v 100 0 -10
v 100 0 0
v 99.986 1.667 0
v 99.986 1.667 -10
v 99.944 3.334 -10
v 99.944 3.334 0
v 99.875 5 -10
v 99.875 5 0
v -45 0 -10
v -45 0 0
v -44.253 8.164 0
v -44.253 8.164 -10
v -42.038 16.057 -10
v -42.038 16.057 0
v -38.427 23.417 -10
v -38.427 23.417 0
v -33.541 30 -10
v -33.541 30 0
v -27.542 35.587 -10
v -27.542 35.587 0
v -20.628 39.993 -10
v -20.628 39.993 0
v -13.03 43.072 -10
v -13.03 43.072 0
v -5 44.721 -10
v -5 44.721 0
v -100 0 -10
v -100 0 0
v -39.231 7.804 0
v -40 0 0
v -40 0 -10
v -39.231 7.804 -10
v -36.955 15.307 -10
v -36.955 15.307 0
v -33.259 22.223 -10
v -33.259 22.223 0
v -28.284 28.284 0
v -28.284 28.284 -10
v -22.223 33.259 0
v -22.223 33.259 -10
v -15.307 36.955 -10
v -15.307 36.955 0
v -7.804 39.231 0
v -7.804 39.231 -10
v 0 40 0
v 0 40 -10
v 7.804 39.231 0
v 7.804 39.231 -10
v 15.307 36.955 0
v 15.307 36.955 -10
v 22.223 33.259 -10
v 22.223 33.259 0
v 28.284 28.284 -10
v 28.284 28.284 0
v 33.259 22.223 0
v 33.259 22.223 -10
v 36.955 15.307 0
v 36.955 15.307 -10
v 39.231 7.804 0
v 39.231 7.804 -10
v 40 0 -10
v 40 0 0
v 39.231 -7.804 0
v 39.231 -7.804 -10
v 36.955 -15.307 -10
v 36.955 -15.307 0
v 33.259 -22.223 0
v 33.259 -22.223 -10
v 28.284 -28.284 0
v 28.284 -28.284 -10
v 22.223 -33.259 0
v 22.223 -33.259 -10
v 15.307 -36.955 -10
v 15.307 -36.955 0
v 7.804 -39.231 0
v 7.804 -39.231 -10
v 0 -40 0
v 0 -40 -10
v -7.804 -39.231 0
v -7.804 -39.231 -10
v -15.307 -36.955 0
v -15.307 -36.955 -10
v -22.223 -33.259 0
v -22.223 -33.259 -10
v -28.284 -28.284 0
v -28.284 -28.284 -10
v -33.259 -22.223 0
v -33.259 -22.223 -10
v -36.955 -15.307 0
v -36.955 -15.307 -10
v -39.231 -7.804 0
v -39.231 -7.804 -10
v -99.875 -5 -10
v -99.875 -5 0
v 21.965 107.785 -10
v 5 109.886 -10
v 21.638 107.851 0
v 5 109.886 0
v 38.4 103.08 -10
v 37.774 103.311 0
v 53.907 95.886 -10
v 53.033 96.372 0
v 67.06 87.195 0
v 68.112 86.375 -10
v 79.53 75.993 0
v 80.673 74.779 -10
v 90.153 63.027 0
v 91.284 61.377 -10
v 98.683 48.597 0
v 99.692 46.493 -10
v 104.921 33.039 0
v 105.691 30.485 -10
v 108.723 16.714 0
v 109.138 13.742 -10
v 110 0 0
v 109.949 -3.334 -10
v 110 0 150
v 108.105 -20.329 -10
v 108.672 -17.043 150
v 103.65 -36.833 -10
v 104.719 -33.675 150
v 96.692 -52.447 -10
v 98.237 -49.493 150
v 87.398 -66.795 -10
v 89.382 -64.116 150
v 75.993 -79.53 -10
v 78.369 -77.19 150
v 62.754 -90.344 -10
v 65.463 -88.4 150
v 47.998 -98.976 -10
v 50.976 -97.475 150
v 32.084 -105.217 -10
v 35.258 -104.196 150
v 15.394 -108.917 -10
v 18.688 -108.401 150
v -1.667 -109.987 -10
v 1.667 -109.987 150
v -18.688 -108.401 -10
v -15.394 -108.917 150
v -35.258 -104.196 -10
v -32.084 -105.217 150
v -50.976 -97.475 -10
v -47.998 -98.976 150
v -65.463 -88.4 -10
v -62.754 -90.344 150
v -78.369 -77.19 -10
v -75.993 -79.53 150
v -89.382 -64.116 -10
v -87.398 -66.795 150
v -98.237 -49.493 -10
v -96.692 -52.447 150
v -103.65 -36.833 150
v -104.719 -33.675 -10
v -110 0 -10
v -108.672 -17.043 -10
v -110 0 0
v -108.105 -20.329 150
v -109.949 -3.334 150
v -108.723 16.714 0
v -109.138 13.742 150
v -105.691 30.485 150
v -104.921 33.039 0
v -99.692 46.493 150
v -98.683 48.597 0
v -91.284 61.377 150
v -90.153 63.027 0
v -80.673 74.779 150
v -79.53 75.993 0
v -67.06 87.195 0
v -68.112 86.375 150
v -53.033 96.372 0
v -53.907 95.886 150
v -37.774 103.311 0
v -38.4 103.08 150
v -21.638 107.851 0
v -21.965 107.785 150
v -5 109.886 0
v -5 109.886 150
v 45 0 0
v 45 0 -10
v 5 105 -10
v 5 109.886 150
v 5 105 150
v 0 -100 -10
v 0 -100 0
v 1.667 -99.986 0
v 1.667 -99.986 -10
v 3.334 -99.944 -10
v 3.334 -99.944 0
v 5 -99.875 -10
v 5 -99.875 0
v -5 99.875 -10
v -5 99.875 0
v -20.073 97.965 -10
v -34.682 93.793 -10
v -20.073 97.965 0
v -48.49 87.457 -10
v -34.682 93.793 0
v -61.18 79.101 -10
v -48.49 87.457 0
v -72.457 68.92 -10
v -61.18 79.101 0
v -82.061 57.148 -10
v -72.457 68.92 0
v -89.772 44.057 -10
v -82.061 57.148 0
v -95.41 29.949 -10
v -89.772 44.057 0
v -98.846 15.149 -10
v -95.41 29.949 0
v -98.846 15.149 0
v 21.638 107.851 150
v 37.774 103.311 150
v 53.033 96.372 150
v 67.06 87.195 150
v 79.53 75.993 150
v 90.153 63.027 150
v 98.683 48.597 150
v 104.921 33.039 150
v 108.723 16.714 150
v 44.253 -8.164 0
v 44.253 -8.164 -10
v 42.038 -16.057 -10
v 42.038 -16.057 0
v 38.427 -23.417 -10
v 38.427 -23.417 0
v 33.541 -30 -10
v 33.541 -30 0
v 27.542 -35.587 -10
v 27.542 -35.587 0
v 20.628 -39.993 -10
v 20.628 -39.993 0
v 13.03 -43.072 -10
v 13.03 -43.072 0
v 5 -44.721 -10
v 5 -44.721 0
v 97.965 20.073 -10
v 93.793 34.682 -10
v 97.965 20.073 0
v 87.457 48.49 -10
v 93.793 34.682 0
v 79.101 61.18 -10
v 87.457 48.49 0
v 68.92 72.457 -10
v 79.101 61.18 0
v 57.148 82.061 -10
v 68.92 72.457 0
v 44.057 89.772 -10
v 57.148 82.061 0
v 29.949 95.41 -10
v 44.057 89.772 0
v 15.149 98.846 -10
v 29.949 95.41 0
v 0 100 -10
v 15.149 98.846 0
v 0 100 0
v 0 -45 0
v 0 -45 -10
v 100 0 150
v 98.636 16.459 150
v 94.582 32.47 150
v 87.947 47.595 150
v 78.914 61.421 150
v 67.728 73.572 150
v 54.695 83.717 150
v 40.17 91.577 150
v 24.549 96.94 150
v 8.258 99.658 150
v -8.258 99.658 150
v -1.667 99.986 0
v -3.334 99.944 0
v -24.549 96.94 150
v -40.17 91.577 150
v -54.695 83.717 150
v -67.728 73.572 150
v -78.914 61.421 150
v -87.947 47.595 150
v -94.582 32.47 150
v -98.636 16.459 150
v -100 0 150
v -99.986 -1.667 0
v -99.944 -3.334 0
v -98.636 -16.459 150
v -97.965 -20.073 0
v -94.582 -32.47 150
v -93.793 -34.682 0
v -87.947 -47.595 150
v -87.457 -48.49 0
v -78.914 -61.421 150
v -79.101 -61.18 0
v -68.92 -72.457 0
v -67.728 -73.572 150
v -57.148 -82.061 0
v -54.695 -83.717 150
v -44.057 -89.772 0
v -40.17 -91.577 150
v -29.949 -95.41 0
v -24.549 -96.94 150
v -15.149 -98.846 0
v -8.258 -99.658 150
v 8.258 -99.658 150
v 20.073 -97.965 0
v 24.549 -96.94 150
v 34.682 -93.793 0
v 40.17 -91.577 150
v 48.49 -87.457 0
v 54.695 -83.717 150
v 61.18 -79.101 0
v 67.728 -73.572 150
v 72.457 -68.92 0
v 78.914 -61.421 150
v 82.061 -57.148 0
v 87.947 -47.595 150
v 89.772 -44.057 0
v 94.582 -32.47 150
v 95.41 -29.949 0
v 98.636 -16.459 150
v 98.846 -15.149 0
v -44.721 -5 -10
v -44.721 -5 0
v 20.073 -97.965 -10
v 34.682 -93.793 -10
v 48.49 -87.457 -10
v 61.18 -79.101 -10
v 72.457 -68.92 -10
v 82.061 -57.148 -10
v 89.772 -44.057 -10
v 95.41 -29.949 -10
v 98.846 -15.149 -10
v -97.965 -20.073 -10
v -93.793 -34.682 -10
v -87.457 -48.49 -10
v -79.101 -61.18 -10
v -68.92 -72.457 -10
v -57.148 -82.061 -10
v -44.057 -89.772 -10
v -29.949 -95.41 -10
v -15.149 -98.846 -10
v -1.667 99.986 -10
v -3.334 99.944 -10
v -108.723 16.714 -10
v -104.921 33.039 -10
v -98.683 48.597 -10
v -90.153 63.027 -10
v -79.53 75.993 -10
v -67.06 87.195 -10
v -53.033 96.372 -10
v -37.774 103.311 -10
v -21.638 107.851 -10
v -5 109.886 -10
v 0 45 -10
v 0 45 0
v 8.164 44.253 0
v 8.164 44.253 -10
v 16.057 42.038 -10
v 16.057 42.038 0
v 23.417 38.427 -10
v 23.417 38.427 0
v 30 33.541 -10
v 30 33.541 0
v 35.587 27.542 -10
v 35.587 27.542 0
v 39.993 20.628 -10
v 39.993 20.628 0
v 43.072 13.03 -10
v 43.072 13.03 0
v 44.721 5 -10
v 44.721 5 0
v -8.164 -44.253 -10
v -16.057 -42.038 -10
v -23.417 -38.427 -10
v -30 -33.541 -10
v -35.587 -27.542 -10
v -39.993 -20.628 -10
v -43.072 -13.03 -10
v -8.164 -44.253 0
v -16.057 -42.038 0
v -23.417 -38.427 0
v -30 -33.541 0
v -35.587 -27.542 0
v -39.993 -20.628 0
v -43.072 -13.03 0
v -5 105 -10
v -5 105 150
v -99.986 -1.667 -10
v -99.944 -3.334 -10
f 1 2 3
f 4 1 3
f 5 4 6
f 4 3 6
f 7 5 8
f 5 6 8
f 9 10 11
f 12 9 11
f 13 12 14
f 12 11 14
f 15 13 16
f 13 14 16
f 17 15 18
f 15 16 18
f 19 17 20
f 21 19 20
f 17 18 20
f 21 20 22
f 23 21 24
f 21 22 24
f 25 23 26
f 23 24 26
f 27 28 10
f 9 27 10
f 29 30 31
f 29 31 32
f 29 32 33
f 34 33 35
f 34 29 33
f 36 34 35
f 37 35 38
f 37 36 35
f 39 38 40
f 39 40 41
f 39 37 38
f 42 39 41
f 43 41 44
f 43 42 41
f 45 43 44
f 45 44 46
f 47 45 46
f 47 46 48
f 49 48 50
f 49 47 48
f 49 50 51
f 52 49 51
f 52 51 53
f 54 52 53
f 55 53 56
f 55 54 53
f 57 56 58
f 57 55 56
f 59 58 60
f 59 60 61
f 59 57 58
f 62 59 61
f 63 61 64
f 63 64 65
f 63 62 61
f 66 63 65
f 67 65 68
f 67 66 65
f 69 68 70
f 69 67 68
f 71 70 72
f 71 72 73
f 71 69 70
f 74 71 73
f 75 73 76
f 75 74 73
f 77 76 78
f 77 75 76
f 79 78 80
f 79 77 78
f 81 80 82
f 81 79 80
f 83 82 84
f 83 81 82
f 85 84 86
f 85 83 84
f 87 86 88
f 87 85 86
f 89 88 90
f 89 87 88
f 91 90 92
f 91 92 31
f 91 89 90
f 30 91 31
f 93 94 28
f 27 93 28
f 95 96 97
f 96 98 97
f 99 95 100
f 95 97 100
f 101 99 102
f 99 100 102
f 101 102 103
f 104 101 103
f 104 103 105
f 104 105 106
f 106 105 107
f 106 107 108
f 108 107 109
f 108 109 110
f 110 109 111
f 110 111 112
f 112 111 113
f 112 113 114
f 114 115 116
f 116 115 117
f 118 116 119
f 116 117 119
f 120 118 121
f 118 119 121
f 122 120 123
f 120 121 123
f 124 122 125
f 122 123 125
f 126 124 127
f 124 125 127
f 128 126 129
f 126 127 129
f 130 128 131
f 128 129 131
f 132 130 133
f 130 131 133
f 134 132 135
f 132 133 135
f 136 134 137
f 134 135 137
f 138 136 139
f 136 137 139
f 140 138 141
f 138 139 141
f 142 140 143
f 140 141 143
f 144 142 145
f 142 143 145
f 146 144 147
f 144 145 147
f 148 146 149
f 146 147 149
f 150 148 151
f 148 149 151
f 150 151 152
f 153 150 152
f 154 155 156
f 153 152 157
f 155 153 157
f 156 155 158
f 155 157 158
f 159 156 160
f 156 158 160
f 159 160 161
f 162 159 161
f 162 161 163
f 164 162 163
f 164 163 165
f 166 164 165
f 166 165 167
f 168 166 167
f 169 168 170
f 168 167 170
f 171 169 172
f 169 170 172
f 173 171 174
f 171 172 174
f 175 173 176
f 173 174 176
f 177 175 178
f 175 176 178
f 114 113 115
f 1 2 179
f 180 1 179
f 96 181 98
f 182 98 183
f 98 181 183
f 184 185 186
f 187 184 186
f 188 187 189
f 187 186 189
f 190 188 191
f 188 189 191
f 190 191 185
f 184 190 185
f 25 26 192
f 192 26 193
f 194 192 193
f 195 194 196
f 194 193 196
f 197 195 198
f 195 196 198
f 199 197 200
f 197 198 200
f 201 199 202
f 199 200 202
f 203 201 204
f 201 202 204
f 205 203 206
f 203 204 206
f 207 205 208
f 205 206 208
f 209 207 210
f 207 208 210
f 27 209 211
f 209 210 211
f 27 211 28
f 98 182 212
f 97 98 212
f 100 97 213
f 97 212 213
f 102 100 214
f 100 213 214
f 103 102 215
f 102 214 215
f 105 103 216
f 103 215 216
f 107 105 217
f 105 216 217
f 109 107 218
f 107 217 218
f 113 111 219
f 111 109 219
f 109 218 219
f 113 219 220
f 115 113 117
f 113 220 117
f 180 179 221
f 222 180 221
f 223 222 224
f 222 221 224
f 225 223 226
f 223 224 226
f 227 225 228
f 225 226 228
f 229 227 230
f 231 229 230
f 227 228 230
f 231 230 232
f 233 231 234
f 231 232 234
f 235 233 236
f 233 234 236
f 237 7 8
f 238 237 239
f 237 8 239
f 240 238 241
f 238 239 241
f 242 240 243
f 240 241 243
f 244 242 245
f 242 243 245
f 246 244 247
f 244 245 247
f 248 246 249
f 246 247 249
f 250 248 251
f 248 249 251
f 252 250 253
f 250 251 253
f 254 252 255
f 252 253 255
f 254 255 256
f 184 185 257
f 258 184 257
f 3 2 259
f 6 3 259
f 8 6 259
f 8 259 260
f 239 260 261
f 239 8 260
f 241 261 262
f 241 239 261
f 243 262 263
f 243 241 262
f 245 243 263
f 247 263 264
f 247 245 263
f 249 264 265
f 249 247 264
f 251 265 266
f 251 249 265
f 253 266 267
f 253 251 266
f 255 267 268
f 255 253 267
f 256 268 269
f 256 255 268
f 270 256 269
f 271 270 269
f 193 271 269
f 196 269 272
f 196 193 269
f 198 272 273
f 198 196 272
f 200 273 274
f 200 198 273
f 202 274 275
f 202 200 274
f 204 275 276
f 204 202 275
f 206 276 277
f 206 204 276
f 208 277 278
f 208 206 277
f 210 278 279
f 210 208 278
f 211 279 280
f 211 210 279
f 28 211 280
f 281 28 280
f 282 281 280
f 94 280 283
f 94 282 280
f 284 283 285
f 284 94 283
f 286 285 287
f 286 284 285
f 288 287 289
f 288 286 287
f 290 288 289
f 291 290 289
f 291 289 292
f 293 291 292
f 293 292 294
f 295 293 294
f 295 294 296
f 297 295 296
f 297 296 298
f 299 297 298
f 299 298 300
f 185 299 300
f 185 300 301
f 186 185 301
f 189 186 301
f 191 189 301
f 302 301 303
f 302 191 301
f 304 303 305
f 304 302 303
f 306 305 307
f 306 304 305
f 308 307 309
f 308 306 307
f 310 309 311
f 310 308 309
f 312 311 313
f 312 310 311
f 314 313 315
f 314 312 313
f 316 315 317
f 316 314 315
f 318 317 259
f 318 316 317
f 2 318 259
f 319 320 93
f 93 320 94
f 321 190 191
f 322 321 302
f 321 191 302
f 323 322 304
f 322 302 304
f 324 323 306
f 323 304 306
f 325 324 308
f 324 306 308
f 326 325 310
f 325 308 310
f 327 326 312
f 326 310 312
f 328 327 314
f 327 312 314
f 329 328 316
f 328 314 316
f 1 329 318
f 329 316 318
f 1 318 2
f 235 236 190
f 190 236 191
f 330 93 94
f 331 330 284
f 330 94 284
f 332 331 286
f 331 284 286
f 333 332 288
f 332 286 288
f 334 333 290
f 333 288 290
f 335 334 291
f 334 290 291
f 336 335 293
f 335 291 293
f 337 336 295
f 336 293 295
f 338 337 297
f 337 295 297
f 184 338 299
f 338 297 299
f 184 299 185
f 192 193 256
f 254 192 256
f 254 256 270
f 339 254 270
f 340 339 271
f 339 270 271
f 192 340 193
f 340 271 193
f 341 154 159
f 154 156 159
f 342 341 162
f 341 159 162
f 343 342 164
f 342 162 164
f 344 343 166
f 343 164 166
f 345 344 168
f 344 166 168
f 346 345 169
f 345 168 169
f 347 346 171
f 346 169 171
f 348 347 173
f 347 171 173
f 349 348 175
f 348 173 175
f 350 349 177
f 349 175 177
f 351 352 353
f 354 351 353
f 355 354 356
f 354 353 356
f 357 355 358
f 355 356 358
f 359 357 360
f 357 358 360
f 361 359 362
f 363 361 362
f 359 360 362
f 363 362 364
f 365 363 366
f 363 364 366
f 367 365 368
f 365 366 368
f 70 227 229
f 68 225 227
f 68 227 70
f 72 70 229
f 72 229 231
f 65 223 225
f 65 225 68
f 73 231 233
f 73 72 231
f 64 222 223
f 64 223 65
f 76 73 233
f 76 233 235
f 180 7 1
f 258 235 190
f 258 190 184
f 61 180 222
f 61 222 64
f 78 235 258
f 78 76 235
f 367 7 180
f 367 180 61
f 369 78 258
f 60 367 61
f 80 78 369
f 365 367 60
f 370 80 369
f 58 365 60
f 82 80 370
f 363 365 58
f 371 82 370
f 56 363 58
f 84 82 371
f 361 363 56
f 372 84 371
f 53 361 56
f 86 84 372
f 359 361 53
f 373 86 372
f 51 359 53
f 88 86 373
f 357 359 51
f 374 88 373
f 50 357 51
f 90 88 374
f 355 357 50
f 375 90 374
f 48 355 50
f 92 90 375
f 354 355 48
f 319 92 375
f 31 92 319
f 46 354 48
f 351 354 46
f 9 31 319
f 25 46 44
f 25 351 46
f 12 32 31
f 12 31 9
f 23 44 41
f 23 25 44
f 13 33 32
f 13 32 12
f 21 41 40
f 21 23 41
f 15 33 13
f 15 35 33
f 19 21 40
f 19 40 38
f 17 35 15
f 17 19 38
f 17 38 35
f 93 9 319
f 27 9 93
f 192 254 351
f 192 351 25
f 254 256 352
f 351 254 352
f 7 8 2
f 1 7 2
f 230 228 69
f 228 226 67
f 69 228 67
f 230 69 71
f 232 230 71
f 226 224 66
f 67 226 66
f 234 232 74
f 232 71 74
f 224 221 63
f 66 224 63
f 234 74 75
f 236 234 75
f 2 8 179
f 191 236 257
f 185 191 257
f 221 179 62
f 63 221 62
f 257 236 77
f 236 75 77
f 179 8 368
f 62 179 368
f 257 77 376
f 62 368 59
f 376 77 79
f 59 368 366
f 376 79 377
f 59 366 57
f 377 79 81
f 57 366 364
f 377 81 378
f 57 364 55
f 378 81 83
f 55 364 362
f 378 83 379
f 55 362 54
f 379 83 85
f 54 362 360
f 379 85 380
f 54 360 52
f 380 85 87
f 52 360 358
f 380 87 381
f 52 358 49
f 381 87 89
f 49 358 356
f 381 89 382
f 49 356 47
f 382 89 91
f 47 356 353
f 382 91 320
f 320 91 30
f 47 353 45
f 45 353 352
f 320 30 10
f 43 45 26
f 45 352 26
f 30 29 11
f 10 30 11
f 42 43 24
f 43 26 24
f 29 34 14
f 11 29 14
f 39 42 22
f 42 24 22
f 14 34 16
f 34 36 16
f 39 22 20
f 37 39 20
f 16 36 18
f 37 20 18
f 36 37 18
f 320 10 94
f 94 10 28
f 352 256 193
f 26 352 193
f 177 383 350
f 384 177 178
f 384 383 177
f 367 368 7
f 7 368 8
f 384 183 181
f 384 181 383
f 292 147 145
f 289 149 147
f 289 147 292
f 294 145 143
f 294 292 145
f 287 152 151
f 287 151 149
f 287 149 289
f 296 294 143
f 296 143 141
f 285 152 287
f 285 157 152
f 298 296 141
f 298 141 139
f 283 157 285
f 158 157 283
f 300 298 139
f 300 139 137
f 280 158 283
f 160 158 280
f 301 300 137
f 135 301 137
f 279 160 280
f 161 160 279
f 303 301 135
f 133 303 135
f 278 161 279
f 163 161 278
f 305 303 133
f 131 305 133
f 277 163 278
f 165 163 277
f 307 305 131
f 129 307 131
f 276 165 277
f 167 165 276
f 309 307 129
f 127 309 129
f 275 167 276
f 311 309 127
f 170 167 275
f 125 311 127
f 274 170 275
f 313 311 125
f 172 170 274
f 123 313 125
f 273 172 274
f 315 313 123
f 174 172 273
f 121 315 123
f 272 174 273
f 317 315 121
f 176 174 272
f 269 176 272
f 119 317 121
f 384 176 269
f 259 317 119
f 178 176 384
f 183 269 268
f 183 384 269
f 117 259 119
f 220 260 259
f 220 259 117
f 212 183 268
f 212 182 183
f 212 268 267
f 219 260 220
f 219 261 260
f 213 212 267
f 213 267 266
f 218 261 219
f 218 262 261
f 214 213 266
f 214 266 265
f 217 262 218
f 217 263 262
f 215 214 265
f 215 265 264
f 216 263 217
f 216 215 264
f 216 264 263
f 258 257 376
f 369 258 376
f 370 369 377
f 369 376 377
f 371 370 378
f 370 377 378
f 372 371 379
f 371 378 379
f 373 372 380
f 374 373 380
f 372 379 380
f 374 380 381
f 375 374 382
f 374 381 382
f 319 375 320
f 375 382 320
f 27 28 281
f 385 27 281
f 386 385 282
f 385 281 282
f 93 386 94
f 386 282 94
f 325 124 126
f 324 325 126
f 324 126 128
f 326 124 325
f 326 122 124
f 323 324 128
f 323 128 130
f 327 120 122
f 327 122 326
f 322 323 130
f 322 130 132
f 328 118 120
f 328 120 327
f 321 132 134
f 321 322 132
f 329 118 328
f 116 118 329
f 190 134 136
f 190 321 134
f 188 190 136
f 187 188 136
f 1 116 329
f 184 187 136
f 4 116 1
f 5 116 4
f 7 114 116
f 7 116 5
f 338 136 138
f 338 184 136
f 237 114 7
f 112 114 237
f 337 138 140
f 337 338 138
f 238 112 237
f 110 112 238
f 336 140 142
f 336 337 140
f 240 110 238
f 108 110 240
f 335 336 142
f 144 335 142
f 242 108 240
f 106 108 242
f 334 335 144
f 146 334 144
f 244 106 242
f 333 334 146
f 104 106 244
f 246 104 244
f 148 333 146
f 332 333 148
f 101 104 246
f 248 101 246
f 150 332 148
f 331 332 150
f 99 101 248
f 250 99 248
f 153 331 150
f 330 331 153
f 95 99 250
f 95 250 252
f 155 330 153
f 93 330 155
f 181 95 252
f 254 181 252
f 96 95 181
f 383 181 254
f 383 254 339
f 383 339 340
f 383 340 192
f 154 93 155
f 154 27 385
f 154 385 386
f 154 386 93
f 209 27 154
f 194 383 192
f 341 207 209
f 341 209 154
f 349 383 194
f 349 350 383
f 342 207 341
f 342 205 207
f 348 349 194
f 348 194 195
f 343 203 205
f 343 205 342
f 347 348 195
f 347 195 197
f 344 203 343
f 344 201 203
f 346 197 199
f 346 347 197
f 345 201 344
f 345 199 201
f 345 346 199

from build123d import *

# Parameters (mm, degrees)
SKETCH1_R           = 110
SKETCH1_R_2         = 100
BOSS_EXTRUDE1_DEPTH = 150
SKETCH2_R           = 110
SKETCH2_R_2         = 40
BOSS_EXTRUDE2_DEPTH = 10
SKETCH4_W           = 10
SKETCH4_H           = 160
CUT_EXTRUDE1_DEPTH  = 10


with BuildPart() as part:
    # Sketch1 → Boss-Extrude1 (new body)
    with BuildSketch(Plane.XY):
        Circle(SKETCH1_R)
        Circle(SKETCH1_R_2, mode=Mode.SUBTRACT)
    extrude(amount=BOSS_EXTRUDE1_DEPTH)

    # Sketch2 → Boss-Extrude2 (add)
    with BuildSketch(Plane(origin=(0, 0, 0), x_dir=(-1, 0, 0), z_dir=(0, 0, -1))):
        Circle(SKETCH2_R)
        with BuildLine():
            ThreePointArc((-99.874921777, 5), (-68.92024376, 72.456883731), (0, 100))
            ThreePointArc((0, 100), (2.500782106, 99.968725554), (5, 99.874921777))
            ThreePointArc((5, 99.874921777), (72.456883731, 68.92024376), (100, 0))
            ThreePointArc((100, 0), (99.968725554, -2.500782106), (99.874921777, -5))
            ThreePointArc((99.874921777, -5), (68.92024376, -72.456883731), (0, -100))
            ThreePointArc((0, -100), (-2.500782106, -99.968725554), (-5, -99.874921777))
            ThreePointArc((-5, -99.874921777), (-72.456883731, -68.92024376), (-100, 0))
            ThreePointArc((-100, 0), (-99.968725554, 2.500782106), (-99.874921777, 5))
        make_face(mode=Mode.SUBTRACT)
        with BuildLine():
            ThreePointArc((-45, 0), (-33.541019662, -30), (-5, -44.72135955))
            Line((-5, -44.72135955), (-5, -99.874921777))
            Line((-5, -99.874921777), (0, -100))
            Line((0, -100), (0, -45))
            ThreePointArc((0, -45), (30, -33.541019662), (44.72135955, -5))
            Line((44.72135955, -5), (99.874921777, -5))
            Line((99.874921777, -5), (100, 0))
            Line((100, 0), (45, 0))
            ThreePointArc((45, 0), (33.541019662, 30), (5, 44.72135955))
            Line((5, 44.72135955), (5, 99.874921777))
            Line((5, 99.874921777), (0, 100))
            Line((0, 100), (0, 45))
            ThreePointArc((0, 45), (-30, 33.541019662), (-44.72135955, 5))
            Line((-44.72135955, 5), (-99.874921777, 5))
            Line((-99.874921777, 5), (-100, 0))
            Line((-100, 0), (-45, 0))
        make_face()
        Circle(SKETCH2_R_2, mode=Mode.SUBTRACT)
    extrude(amount=BOSS_EXTRUDE2_DEPTH)


with BuildPart() as boss_extrude2_piece_1:
    # of the separate pieces the step leaves, piece 1, a body of its own (boss_extrude2_pieces)
    add(part.part.solids().sort_by_distance((110, 0, 0))[0])

    # Sketch4 → Cut-Extrude1 (cut)
    with BuildSketch(Plane(origin=(0, 105, 0), x_dir=(-1, 0, 0), z_dir=(0, 1, 0))):
        with Locations((0, 70)):
            Rectangle(SKETCH4_W, SKETCH4_H)
    extrude(amount=CUT_EXTRUDE1_DEPTH, mode=Mode.SUBTRACT)


with BuildPart() as boss_extrude2_piece_2:
    # of the separate pieces the step leaves, piece 2, a body of its own (boss_extrude2_pieces)
    add(part.part.solids().sort_by_distance((5, -44.72135955, 0))[0])


solid = Compound([boss_extrude2_piece_1.part, boss_extrude2_piece_2.part])
